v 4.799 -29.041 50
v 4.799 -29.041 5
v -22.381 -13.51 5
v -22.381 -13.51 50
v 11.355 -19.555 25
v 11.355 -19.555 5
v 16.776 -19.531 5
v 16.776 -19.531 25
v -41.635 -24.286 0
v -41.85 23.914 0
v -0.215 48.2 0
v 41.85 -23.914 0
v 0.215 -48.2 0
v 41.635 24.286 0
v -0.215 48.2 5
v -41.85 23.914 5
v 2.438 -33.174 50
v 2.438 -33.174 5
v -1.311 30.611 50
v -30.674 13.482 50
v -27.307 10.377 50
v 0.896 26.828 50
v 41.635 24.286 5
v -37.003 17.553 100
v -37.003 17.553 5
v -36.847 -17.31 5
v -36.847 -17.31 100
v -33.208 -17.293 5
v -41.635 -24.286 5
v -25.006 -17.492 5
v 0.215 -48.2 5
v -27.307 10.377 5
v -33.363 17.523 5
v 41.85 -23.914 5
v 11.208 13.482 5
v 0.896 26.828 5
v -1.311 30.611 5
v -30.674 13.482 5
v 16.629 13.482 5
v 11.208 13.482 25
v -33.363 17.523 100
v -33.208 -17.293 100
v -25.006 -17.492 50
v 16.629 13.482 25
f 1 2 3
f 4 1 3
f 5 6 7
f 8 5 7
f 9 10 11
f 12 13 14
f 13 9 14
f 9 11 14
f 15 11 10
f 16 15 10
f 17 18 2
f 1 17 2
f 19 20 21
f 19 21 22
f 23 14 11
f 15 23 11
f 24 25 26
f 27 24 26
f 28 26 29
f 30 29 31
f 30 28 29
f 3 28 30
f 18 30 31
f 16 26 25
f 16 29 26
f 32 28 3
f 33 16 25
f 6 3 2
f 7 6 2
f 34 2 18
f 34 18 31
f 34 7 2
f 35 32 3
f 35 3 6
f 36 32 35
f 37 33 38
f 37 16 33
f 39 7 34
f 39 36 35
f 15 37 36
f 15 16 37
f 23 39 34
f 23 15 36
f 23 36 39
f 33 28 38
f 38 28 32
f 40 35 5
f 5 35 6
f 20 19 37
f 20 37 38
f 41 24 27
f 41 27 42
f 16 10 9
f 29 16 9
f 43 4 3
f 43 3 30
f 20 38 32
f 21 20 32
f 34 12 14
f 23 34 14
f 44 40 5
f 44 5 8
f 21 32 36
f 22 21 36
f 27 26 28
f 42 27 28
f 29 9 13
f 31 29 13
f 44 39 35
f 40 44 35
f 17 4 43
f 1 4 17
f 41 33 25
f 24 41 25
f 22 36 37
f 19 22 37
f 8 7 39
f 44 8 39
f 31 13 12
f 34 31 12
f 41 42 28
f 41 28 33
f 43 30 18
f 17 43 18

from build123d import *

# Parameters (mm, degrees)
F1_DEPTH = 100
F2_DEPTH = 5
F3_DEPTH = 50
F4_DEPTH = 25


with BuildPart() as f1:
    # F0 (on Top) → F1 (new body)
    with BuildSketch(Plane.XY):
        Polygon((-33.36327, 17.523126), (-37.003014, 17.552711), (-36.847473, -17.309527), (-33.207933, -17.293289), align=None)
    extrude(amount=F1_DEPTH)

    # F0 (on Top) → F2 (join)
    with BuildSketch(Plane.XY):
        Polygon((0.215048, -48.199569), (41.849575, -23.913548), (41.634527, 24.286021), (-0.215048, 48.199569), (-41.849575, 23.913548), (-41.634527, -24.286021), align=None)
        Polygon((2.437659, -33.173904), (-25.006169, -17.492041), (-22.380813, -13.510428), (4.799019, -29.041439), align=None, mode=Mode.SUBTRACT)
        Polygon((11.207818, 13.482378), (16.628671, 13.482378), (16.775963, -19.530714), (11.355217, -19.5549), align=None, mode=Mode.SUBTRACT)
        Polygon((-36.847473, -17.309527), (-37.003014, 17.552711), (-33.36327, 17.523126), (-33.207933, -17.293289), align=None, mode=Mode.SUBTRACT)
        Polygon((-27.306872, 10.376645), (-30.674437, 13.482378), (-1.310807, 30.610607), (0.895825, 26.827686), align=None, mode=Mode.SUBTRACT)
    extrude(amount=F2_DEPTH)

    # F0 (on Top) → F3 (join)
    with BuildSketch(Plane.XY):
        Polygon((-1.310807, 30.610607), (-30.674437, 13.482378), (-27.306872, 10.376645), (0.895825, 26.827686), align=None)
        Polygon((-22.380813, -13.510428), (-25.006169, -17.492041), (2.437659, -33.173904), (4.799019, -29.041439), align=None)
    extrude(amount=F3_DEPTH)

    # F0 (on Top) → F4 (join)
    with BuildSketch(Plane.XY):
        Polygon((16.775963, -19.530714), (16.628671, 13.482378), (11.207818, 13.482378), (11.355217, -19.5549), align=None)
    extrude(amount=F4_DEPTH)


solid = f1.part
